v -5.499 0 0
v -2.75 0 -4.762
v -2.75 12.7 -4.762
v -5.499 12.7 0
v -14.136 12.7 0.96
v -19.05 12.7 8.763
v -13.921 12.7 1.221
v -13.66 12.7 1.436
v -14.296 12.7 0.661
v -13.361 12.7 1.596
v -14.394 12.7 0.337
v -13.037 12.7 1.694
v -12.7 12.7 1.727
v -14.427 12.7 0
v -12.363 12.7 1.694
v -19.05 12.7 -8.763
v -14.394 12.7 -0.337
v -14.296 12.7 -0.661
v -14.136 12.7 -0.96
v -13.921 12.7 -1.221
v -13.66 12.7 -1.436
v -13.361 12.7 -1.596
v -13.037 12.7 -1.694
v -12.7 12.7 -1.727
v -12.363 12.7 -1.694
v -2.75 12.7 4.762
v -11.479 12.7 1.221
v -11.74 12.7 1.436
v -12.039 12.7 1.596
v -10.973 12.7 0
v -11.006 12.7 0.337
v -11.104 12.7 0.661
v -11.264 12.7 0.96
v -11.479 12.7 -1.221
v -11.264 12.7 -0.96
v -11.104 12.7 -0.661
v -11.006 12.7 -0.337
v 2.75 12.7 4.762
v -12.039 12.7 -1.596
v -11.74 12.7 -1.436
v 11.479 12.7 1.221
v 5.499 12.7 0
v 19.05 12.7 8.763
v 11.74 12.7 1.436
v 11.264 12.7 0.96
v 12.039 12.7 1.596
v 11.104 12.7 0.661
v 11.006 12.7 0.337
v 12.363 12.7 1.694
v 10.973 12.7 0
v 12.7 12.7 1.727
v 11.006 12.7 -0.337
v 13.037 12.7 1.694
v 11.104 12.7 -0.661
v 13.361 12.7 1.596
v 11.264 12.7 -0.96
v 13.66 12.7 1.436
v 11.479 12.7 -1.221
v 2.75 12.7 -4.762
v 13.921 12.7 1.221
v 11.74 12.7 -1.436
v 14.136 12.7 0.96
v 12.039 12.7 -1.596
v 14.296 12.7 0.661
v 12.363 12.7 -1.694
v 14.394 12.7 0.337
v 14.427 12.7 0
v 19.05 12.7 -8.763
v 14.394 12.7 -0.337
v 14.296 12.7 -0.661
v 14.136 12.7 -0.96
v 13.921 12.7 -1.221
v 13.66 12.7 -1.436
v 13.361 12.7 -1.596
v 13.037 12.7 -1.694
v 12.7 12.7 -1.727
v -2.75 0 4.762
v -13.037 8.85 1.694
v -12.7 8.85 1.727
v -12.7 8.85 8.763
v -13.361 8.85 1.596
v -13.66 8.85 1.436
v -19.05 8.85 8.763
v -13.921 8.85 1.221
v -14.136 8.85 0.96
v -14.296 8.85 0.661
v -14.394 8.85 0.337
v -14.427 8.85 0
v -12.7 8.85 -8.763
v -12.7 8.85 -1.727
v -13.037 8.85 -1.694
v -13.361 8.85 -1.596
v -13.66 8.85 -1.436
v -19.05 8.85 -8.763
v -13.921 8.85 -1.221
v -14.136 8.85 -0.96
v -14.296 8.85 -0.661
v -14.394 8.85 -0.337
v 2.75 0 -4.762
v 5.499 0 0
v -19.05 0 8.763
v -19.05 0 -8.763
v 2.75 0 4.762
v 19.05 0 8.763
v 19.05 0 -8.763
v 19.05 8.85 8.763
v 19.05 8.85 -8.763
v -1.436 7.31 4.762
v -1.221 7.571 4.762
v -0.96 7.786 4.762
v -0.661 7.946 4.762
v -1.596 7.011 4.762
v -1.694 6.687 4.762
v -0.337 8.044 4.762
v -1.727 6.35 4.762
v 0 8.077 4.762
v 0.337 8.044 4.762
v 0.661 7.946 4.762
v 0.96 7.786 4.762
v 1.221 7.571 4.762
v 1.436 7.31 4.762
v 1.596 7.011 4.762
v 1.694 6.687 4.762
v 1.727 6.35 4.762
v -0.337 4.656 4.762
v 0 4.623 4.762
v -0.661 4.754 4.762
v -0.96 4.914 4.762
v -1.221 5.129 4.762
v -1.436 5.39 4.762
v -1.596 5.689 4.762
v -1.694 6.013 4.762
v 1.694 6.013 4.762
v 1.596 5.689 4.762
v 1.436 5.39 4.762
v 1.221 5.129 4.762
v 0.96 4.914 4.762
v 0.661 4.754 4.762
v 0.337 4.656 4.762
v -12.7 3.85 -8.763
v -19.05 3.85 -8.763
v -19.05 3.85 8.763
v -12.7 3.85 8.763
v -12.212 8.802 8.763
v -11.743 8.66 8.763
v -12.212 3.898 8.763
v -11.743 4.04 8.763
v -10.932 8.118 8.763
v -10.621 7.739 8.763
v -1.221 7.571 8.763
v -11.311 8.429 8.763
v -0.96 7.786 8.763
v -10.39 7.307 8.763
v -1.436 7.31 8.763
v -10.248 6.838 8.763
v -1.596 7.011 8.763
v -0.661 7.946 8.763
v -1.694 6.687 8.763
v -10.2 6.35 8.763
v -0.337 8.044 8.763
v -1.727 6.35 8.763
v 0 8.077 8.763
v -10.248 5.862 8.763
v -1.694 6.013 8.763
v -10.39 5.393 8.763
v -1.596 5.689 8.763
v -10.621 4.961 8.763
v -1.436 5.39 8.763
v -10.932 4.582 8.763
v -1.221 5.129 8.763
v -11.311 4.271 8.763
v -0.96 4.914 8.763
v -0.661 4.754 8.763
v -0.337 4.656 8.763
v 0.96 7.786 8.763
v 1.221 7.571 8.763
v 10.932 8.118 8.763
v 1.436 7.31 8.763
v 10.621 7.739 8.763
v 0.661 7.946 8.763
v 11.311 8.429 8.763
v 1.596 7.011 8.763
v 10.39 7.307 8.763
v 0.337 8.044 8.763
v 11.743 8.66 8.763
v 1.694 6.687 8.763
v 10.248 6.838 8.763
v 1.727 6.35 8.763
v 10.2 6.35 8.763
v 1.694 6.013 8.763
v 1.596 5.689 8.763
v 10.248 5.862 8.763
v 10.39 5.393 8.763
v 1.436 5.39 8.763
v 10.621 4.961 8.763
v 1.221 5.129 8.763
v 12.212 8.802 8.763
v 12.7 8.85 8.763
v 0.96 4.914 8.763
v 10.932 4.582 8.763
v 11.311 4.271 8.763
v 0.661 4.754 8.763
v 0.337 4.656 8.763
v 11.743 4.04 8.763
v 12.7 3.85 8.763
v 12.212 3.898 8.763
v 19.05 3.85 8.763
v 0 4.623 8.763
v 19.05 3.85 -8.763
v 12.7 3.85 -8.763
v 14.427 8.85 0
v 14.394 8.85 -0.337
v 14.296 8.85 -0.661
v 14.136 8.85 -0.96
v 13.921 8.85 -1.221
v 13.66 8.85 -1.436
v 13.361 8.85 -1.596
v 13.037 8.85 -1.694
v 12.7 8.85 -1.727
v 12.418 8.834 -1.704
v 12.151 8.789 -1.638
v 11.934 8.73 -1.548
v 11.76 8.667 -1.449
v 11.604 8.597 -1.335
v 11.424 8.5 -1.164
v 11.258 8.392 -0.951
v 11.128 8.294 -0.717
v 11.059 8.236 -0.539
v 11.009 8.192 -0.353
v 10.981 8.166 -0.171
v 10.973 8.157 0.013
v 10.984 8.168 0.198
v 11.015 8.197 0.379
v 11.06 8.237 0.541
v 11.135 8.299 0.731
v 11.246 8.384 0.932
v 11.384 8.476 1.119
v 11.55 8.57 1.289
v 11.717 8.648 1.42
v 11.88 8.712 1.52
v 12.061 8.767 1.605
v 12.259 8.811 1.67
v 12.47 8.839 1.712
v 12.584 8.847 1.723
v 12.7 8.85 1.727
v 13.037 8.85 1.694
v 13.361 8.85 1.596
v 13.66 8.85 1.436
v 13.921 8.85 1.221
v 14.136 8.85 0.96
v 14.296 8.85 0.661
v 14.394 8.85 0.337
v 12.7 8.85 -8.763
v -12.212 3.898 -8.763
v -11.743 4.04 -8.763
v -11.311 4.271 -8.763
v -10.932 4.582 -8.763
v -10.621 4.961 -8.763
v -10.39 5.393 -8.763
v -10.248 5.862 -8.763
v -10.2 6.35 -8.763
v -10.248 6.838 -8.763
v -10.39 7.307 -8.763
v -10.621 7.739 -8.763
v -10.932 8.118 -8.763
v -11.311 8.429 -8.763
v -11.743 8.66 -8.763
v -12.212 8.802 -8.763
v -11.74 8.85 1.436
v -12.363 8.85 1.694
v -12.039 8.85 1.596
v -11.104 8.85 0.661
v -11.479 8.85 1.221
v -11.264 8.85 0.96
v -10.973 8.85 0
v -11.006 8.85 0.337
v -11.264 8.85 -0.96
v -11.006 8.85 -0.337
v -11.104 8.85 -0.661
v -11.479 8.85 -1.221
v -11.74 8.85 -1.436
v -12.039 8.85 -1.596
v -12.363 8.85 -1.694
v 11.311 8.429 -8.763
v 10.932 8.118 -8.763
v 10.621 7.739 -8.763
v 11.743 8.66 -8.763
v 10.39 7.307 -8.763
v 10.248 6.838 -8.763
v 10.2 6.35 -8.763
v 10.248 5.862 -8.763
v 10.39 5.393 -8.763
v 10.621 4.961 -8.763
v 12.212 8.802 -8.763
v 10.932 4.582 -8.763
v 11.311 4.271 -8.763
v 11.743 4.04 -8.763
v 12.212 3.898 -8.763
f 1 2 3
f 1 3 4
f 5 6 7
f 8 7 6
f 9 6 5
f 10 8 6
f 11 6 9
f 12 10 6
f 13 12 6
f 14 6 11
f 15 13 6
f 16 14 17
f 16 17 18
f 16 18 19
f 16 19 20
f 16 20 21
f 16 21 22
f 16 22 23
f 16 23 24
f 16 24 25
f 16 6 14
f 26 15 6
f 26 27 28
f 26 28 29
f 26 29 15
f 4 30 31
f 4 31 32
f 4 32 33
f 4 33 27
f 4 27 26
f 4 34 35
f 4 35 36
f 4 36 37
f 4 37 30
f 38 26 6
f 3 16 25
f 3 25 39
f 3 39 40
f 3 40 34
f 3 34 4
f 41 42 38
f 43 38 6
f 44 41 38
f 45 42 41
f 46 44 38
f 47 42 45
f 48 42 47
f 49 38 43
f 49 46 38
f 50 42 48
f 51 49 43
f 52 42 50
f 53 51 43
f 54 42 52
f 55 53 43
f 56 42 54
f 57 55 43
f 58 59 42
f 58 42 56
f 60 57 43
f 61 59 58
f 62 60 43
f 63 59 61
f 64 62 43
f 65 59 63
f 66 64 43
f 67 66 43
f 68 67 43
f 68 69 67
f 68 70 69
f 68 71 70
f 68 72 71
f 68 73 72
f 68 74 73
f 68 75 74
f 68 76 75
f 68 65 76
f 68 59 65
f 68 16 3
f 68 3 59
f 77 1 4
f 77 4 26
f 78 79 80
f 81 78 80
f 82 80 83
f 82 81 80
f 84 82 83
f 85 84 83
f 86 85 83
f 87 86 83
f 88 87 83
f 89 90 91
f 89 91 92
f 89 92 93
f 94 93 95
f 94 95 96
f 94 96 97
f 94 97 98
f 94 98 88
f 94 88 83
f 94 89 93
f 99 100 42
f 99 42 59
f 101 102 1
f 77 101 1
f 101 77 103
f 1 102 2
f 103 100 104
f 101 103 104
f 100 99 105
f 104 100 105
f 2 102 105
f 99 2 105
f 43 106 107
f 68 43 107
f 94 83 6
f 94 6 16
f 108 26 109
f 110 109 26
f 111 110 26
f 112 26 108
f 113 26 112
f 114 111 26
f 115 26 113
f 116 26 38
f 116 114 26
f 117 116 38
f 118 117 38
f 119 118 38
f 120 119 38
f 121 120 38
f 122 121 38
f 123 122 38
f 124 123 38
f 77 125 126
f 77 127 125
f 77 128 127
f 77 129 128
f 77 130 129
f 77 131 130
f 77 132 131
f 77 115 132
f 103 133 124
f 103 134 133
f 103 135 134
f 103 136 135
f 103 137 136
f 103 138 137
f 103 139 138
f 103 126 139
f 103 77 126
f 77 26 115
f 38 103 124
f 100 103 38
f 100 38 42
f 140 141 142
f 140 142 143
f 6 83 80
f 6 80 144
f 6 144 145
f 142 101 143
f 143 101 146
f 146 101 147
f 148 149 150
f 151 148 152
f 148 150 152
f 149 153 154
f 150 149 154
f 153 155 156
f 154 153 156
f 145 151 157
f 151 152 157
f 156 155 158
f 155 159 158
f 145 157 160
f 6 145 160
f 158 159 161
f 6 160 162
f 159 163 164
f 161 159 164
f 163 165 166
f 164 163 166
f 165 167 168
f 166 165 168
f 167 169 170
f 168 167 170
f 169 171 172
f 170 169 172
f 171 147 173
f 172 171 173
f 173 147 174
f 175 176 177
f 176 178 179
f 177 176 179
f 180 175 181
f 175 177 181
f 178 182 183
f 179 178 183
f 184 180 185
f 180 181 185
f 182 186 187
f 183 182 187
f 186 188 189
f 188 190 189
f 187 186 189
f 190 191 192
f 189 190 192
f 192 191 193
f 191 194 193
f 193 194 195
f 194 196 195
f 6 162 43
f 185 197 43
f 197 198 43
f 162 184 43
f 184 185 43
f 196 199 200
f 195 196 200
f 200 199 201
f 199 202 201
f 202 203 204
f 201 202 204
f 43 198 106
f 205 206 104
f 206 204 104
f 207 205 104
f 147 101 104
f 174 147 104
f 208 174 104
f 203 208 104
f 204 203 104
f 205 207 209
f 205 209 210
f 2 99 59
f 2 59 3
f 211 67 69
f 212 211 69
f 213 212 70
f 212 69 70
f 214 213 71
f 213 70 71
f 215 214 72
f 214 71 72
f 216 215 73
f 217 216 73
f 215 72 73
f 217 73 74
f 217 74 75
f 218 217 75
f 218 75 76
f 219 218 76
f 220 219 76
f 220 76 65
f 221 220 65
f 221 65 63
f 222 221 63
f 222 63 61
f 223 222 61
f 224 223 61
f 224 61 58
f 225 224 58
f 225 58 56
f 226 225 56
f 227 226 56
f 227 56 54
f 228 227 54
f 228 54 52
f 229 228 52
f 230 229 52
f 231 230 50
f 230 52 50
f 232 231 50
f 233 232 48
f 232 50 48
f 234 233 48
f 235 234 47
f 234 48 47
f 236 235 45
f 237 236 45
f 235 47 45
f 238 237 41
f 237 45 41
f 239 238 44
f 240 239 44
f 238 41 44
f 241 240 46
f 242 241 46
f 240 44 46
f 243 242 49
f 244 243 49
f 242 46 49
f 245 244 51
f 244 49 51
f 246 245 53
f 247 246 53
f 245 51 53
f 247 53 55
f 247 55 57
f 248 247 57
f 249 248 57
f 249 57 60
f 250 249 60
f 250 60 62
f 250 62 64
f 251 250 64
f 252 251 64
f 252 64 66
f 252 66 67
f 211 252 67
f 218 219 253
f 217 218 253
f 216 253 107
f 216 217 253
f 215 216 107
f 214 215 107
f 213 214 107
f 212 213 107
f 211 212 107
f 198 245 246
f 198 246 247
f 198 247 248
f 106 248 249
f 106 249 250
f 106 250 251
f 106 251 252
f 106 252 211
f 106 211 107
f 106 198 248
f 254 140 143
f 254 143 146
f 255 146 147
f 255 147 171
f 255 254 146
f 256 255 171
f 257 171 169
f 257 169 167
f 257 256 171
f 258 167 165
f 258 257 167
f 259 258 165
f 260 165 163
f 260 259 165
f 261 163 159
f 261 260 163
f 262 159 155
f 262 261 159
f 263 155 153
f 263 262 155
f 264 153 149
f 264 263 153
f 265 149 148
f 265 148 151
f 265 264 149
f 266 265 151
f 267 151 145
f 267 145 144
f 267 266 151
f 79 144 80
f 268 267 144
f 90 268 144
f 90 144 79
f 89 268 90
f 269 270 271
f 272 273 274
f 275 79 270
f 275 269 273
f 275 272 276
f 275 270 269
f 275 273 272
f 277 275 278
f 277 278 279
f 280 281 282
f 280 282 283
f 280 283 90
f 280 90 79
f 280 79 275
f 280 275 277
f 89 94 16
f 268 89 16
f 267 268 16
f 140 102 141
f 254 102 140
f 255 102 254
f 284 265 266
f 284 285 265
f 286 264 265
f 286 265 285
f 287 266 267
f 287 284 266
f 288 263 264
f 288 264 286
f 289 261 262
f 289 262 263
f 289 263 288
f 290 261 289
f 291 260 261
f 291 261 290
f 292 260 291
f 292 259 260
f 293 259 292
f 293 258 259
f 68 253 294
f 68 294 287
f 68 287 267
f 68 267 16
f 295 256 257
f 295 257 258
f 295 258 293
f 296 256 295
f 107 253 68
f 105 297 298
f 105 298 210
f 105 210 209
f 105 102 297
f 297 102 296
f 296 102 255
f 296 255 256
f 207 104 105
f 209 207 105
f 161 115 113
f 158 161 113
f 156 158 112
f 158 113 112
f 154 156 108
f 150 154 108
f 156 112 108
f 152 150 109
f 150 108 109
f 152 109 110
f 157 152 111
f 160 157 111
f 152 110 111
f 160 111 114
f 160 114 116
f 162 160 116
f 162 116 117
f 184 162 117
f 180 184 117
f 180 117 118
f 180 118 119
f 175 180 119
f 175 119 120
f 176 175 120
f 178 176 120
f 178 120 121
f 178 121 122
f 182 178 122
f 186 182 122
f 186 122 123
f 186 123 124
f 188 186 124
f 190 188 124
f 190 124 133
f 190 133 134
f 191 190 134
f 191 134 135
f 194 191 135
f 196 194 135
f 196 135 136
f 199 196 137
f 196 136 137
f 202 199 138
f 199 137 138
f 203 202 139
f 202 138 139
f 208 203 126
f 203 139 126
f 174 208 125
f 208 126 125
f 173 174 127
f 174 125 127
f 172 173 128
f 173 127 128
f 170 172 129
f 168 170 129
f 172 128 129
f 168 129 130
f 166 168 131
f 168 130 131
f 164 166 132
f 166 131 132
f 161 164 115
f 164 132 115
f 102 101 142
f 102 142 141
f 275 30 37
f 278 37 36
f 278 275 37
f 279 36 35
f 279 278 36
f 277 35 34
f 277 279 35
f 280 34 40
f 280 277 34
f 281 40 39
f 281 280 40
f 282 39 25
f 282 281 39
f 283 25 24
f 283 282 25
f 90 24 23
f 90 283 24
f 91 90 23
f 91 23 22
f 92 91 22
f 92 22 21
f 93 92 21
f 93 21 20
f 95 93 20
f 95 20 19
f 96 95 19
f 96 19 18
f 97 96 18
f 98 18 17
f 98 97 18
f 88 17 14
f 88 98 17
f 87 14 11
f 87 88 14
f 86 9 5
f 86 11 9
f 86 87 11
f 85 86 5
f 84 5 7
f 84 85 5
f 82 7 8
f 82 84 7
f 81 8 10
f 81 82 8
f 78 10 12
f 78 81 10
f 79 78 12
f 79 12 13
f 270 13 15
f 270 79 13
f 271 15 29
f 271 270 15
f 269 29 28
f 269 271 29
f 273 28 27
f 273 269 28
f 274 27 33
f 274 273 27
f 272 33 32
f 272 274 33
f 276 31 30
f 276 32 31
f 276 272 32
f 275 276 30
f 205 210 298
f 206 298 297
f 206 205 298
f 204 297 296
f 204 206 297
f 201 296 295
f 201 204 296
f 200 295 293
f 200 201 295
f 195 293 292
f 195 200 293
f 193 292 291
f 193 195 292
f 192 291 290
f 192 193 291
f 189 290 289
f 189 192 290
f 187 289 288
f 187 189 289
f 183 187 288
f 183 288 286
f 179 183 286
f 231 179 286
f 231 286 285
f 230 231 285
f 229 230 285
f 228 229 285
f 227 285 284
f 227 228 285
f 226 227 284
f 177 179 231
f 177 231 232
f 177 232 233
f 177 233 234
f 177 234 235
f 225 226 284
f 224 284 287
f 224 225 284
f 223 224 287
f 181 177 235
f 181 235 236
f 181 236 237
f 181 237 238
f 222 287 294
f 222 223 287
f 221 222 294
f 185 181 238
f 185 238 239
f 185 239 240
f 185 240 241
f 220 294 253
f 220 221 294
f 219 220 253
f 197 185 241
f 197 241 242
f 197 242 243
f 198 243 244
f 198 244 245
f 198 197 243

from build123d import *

# Parameters (mm, degrees)
SKETCH1_W                  = 38.1
SKETCH1_H                  = 17.526
BOSS_EXTRUDE1_DEPTH        = 12.7
CUT_EXTRUDE1_DEPTH         = 25.4
F_8_32_TAPPED_HOLE1_REACH  = 26.515
F_8_32_TAPPED_HOLE1_BORE_R = 1.7272
MIRROR1_START              = -8.763
MIRROR1_DEPTH              = 17.526
MIRROR1_START_2            = 8.85
MIRROR1_2_OUTLINE_R        = 1.7272
MIRROR1_2_DEPTH            = 5.15
F_8_32_TAPPED_HOLE2_D      = 3.4544
F_8_32_TAPPED_HOLE2_DEPTH  = 10.668
F_8_32_TAPPED_HOLE2_TIP    = 1.037806461


with BuildPart() as part:
    # Sketch1 → Boss-Extrude1 (new body)
    with BuildSketch(Plane(origin=(0, 0, 0), x_dir=(1, 0, 0), z_dir=(0, 1, 0))):
        Rectangle(SKETCH1_W, SKETCH1_H)
        Polygon((5.499261314, 0), (2.749630657, 4.7625), (-2.749630657, 4.7625), (-5.499261314, 0), (-2.749630657, -4.7625), (2.749630657, -4.7625), align=None, mode=Mode.SUBTRACT)
    extrude(amount=BOSS_EXTRUDE1_DEPTH)

    # Sketch2 → Cut-Extrude1 (cut)
    with BuildSketch(Plane.XY.offset(8.763)):
        with BuildLine():
            Line((12.7, 8.85), (19.05, 8.85))
            ThreePointArc((19.05, 8.85), (21.55, 6.35), (19.05, 3.85))
            Line((19.05, 3.85), (12.7, 3.85))
            ThreePointArc((12.7, 3.85), (10.2, 6.35), (12.7, 8.85))
        make_face()
    extrude(amount=-CUT_EXTRUDE1_DEPTH, mode=Mode.SUBTRACT)

    # #8-32 Tapped Hole1 bore → #8-32 Tapped Hole1 (cut, up to next)
    with BuildSketch(Plane(origin=(0, 12.7, 0), x_dir=(1, 0, 0), z_dir=(0, 1, 0)), mode=Mode.PRIVATE) as f_8_32_tapped_hole1_sk1:
        with Locations((12.7, 0)):
            Circle(F_8_32_TAPPED_HOLE1_BORE_R)
    f_8_32_tapped_hole1_tool1 = extrude(f_8_32_tapped_hole1_sk1.sketch, amount=-F_8_32_TAPPED_HOLE1_REACH, mode=Mode.PRIVATE) & part.part
    add(f_8_32_tapped_hole1_tool1.solids().sort_by_distance((12.7, 12.7, 0))[0], mode=Mode.SUBTRACT)

    # Mirror1: read off the stored shape, not the designer's step
    # Mirror1 outline → Mirror1 (cut)
    with BuildSketch(Plane.XY.offset(MIRROR1_START)):
        with BuildLine():
            Line((-12.7, 8.85), (-19.05, 8.85))
            Line((-19.05, 8.85), (-19.05, 3.85))
            Line((-19.05, 3.85), (-12.7, 3.85))
            ThreePointArc((-12.7, 3.85), (-10.2, 6.35), (-12.7, 8.85))
        make_face()
    extrude(amount=MIRROR1_DEPTH, mode=Mode.SUBTRACT)

    # Mirror1 2 outline → Mirror1 2 (cut)
    with BuildSketch(Plane(origin=(0, 0, 0), x_dir=(1, 0, 0), z_dir=(0, 1, 0)).offset(MIRROR1_START_2)):
        with Locations((-12.7, 0)):
            Circle(MIRROR1_2_OUTLINE_R)
    extrude(amount=MIRROR1_2_DEPTH, mode=Mode.SUBTRACT)

    # #8-32 Tapped Hole2
    with Locations(Plane.XY.offset(8.763)):
        with Locations((0, 6.35)):
            Hole(F_8_32_TAPPED_HOLE2_D / 2, depth=F_8_32_TAPPED_HOLE2_DEPTH)
            with Locations((0, 0, -(F_8_32_TAPPED_HOLE2_DEPTH + F_8_32_TAPPED_HOLE2_TIP / 2))):  # 118° drill point
                Cone(0, F_8_32_TAPPED_HOLE2_D / 2, F_8_32_TAPPED_HOLE2_TIP, mode=Mode.SUBTRACT)


solid = part.part
